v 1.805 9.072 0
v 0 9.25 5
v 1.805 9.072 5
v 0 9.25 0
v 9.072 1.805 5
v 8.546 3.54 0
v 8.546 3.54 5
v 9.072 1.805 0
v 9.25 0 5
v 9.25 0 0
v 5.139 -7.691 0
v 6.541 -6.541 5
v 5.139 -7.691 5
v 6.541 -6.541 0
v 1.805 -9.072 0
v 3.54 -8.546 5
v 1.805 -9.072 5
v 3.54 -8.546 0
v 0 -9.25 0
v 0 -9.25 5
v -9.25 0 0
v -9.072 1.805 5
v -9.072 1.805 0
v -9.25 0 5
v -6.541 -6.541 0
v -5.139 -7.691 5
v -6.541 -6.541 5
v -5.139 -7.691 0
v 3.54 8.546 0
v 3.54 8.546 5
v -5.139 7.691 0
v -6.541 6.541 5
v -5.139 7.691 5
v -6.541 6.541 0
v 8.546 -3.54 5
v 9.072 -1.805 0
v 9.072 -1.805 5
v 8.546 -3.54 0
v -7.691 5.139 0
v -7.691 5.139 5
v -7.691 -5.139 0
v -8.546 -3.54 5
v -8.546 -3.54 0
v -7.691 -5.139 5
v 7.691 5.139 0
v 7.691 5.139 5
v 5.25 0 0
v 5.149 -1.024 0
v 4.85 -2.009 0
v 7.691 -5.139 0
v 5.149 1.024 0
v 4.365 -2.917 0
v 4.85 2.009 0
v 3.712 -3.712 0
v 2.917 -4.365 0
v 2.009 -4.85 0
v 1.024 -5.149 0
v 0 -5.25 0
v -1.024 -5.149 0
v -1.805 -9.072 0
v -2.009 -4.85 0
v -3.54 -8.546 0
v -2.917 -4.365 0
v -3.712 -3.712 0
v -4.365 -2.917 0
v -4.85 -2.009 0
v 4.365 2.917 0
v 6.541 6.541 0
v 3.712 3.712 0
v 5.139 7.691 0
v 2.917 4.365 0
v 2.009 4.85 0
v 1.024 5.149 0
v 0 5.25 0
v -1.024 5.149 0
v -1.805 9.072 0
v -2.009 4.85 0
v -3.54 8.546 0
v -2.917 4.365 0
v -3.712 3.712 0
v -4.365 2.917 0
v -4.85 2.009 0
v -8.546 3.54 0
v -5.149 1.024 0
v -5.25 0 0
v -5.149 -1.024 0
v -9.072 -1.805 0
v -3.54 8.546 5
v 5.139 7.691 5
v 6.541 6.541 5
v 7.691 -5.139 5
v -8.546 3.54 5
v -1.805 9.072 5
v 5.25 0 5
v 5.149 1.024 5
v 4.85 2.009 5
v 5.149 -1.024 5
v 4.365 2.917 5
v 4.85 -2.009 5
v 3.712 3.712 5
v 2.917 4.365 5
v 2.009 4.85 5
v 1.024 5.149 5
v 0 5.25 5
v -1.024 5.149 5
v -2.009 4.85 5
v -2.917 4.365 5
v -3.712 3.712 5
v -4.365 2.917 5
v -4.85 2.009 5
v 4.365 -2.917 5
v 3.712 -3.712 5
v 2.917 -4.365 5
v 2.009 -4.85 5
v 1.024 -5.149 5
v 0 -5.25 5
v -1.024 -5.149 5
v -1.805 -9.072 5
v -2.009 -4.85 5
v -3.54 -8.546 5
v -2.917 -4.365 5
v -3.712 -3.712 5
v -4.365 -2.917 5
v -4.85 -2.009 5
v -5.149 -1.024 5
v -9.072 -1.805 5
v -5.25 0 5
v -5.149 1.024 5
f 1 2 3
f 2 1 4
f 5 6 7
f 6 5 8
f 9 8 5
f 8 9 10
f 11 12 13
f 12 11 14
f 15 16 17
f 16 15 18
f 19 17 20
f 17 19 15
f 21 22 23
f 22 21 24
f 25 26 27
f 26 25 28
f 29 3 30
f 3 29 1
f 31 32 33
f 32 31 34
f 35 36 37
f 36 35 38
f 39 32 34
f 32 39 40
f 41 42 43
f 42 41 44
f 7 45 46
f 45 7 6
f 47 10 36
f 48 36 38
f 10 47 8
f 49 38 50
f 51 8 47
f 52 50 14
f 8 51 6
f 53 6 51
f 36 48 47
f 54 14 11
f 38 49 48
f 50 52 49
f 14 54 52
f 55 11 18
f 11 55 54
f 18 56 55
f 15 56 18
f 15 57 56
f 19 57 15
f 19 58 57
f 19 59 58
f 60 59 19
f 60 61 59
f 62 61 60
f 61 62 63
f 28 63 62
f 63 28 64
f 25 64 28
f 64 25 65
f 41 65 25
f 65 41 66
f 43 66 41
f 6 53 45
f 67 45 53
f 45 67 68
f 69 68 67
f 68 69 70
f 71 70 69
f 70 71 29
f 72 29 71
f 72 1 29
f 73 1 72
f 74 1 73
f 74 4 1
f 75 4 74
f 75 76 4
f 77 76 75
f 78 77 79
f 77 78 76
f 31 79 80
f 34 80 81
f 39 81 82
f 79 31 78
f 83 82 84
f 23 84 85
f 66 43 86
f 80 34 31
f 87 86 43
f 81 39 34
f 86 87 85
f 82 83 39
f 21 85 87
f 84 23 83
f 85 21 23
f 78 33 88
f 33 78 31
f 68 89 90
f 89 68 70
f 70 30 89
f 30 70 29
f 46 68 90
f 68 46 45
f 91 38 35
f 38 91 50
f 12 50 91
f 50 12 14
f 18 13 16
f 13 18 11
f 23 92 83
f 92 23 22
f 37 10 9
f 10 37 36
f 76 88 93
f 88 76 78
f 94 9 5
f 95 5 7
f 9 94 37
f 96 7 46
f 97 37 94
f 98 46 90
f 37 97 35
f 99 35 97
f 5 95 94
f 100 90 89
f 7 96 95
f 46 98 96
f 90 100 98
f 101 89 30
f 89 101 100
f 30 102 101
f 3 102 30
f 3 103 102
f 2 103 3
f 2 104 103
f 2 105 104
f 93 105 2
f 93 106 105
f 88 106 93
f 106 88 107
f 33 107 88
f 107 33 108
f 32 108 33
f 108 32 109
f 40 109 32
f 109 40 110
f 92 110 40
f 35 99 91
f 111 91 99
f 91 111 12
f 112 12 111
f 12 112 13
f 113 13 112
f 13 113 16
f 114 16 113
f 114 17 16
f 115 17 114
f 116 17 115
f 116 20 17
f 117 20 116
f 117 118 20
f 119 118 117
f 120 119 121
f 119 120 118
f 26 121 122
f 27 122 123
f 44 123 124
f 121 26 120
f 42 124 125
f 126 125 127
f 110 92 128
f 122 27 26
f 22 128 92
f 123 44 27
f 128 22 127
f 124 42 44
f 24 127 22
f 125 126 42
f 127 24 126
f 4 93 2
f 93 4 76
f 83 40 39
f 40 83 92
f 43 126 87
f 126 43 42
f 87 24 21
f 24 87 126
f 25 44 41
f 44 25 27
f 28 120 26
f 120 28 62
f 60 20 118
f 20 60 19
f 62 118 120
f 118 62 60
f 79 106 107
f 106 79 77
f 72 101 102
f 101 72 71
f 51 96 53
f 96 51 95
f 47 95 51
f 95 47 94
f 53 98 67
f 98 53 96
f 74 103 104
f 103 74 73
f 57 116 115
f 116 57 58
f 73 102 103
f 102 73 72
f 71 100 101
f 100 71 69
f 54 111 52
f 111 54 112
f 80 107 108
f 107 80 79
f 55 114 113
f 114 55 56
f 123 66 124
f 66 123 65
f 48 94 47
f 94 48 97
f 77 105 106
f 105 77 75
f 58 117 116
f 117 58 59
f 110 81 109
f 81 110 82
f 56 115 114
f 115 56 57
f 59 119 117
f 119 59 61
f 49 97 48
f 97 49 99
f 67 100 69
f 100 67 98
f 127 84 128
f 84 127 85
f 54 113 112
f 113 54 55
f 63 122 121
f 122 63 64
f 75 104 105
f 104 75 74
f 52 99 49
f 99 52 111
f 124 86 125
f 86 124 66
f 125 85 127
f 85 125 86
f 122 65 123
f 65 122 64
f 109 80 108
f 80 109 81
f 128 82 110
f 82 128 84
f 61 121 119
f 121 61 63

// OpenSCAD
$fn = 32;

// ----------------------------------------------------------------------
// Spacer sleeve: 18.5 / 10.5 x 5 mm
// ----------------------------------------------------------------------

// --- parameters (mm) ---
sleeve_od = 18.5;         // outside diameter
sleeve_id = 10.5;         // shaft bore
sleeve_l = 5;             // sleeve length

module sleeve() {
  cylinder(h = sleeve_l, d = sleeve_od);
}

difference() {
  sleeve();
  translate([0, 0, -1]) cylinder(h = sleeve_l + 2, d = sleeve_id);
}
